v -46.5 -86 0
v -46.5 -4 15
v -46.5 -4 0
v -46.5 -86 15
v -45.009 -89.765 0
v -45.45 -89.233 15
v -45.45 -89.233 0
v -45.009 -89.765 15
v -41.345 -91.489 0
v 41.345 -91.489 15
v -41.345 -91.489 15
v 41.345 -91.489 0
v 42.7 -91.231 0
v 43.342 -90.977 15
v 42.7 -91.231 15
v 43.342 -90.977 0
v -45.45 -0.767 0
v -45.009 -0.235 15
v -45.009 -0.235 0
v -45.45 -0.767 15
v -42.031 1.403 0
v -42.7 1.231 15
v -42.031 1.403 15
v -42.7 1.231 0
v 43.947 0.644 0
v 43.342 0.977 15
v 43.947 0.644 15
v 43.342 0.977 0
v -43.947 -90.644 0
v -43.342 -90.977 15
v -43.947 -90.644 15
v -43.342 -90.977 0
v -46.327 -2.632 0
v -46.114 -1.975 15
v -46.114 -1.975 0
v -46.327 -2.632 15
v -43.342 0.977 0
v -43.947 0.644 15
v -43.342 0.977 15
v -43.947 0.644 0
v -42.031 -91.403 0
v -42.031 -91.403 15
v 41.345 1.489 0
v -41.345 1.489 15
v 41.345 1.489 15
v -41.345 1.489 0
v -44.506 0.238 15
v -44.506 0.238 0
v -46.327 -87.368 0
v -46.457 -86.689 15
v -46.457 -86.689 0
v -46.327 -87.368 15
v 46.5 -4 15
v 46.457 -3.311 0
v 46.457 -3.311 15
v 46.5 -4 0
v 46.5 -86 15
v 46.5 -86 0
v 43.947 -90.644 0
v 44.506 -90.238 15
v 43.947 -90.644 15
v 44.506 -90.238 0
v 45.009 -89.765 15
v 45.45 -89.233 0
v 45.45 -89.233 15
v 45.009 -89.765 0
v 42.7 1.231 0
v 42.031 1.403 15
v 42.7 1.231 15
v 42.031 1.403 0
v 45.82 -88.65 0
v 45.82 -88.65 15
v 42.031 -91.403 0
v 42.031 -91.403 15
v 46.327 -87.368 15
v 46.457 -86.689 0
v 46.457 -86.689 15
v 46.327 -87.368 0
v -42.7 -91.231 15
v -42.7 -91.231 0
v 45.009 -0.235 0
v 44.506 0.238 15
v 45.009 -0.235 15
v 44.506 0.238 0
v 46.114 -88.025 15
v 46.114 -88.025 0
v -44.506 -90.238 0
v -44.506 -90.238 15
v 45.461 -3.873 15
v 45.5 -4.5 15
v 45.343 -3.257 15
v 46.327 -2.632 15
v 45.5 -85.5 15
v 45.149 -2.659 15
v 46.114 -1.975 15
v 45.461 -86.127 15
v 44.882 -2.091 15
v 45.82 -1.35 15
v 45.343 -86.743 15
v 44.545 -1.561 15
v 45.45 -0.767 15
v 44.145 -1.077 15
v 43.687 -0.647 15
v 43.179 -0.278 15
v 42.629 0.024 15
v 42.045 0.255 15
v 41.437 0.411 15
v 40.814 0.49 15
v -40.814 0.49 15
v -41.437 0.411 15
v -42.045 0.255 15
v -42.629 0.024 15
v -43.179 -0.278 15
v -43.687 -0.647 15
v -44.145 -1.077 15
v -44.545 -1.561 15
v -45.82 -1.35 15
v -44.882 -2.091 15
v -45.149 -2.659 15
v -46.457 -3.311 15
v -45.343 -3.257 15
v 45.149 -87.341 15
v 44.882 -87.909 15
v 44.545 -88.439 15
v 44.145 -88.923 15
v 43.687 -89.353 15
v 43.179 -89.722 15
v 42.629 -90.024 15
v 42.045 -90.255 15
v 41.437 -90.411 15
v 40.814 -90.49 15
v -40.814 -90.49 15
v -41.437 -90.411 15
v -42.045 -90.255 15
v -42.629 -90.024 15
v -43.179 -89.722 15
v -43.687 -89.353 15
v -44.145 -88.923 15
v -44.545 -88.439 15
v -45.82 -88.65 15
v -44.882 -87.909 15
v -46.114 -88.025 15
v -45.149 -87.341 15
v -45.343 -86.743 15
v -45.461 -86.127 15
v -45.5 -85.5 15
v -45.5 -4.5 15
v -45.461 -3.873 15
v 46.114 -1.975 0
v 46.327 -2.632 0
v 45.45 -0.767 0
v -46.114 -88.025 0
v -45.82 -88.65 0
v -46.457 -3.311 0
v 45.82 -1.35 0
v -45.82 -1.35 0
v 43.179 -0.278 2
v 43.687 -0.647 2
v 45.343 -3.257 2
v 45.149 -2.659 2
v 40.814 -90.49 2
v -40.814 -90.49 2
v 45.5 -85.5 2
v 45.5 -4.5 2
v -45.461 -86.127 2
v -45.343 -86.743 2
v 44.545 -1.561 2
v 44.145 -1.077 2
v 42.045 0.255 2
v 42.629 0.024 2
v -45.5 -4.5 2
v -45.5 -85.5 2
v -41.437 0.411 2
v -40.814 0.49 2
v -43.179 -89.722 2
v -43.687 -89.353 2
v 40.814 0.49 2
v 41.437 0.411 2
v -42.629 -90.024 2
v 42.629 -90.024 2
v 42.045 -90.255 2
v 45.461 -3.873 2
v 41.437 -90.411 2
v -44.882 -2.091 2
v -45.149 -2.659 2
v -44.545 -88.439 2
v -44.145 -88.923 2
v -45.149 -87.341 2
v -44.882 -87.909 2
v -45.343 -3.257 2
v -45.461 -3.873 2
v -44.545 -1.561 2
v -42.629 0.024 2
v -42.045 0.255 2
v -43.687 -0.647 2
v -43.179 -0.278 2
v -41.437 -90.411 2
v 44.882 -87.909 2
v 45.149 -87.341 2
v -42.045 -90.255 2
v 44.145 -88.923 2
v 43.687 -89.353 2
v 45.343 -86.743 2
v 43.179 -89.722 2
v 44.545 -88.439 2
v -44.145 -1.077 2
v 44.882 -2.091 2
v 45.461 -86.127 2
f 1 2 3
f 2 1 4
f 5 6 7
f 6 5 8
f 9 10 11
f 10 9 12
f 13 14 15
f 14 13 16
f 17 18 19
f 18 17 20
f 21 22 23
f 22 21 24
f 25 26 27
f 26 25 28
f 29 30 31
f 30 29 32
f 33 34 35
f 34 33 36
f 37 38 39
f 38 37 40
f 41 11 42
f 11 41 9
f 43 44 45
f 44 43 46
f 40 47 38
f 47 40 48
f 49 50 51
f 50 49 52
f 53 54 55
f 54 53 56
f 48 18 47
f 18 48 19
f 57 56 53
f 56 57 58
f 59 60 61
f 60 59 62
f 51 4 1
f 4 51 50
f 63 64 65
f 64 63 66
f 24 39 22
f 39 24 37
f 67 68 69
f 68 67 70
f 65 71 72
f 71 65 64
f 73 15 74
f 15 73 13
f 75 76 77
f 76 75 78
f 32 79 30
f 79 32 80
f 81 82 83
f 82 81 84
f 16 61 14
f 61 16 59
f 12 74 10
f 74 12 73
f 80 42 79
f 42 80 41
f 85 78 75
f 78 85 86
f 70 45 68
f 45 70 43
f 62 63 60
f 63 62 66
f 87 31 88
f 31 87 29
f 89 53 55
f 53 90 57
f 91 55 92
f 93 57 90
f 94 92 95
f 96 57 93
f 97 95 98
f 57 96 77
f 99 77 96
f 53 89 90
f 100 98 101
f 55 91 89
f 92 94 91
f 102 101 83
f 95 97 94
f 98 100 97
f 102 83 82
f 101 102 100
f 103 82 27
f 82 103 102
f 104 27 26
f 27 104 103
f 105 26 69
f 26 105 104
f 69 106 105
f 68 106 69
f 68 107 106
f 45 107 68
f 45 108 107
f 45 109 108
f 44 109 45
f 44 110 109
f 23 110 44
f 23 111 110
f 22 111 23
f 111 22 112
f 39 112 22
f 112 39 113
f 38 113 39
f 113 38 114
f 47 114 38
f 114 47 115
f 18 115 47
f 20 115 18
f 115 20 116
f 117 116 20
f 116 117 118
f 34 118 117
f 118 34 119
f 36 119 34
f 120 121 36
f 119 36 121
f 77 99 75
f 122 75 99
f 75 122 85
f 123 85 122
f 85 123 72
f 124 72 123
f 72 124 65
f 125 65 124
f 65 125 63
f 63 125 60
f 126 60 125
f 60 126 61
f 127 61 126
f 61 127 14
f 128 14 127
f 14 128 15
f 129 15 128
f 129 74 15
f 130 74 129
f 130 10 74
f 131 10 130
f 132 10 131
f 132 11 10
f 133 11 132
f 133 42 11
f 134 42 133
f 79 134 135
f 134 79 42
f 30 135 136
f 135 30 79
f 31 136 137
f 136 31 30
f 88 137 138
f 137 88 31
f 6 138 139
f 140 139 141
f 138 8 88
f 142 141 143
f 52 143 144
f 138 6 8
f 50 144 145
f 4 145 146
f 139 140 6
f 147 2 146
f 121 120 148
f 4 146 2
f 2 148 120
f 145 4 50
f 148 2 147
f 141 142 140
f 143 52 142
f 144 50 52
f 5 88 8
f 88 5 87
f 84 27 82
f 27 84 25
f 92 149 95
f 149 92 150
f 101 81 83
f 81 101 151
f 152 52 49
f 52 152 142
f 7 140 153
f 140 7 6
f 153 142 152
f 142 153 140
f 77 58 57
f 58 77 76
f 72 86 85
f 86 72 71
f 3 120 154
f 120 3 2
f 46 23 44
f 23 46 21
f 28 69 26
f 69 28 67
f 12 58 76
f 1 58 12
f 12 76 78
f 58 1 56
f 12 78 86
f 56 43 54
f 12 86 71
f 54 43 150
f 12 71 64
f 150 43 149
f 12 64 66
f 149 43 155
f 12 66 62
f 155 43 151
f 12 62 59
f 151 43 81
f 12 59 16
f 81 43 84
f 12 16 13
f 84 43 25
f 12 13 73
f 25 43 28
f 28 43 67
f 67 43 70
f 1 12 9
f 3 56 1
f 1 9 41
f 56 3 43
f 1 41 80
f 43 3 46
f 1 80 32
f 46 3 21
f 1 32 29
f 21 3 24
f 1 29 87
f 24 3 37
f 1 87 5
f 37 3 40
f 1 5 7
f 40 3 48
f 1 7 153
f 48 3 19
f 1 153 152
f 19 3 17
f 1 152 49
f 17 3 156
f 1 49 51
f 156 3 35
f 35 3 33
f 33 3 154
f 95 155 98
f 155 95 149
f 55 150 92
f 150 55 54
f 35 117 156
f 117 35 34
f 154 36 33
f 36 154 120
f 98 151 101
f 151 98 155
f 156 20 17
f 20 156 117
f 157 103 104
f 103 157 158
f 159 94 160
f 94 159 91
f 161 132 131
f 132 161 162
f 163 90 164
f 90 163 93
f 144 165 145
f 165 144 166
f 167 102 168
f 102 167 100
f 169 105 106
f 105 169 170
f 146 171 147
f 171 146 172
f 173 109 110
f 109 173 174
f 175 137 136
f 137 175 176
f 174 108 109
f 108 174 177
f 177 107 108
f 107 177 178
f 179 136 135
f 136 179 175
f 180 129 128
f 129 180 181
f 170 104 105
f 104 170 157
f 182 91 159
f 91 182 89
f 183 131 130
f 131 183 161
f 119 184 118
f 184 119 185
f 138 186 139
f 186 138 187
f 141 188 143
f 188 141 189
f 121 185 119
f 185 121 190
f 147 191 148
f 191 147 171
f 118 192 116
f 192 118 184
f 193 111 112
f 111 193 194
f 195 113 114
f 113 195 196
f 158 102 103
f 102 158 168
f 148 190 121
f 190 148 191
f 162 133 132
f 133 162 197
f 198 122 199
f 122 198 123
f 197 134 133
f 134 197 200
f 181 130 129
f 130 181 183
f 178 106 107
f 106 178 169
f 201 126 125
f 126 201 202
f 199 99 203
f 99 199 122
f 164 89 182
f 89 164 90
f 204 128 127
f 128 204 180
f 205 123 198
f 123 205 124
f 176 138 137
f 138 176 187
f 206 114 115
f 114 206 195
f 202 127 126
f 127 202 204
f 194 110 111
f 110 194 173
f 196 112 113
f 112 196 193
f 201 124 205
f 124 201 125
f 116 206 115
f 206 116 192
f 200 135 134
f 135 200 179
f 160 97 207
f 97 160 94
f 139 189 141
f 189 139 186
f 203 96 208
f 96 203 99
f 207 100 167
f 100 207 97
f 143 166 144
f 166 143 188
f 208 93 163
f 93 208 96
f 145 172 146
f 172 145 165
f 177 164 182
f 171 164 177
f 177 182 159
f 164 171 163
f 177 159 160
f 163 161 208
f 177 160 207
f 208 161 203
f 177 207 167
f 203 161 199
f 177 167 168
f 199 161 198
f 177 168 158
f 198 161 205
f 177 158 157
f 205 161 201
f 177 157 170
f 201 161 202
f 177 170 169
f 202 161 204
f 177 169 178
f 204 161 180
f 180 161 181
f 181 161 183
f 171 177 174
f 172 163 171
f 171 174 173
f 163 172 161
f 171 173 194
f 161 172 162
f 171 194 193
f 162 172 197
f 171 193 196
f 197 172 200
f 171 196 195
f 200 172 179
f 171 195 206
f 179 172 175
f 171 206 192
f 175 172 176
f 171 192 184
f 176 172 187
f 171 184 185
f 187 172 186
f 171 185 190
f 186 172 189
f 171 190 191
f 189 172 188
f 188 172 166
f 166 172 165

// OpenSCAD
$fn = 50;


difference() {
	union() {
		translate(v = [0, -45.0000000000, 0]) {
			hull() {
				translate(v = [-41.0000000000, 41.0000000000, 0]) {
					cylinder(h = 15, r = 5.5000000000);
				}
				translate(v = [41.0000000000, 41.0000000000, 0]) {
					cylinder(h = 15, r = 5.5000000000);
				}
				translate(v = [-41.0000000000, -41.0000000000, 0]) {
					cylinder(h = 15, r = 5.5000000000);
				}
				translate(v = [41.0000000000, -41.0000000000, 0]) {
					cylinder(h = 15, r = 5.5000000000);
				}
			}
		}
	}
	union() {
		translate(v = [0, -45.0000000000, 2]) {
			hull() {
				translate(v = [-40.5000000000, 40.5000000000, 0]) {
					cylinder(h = 30, r = 5);
				}
				translate(v = [40.5000000000, 40.5000000000, 0]) {
					cylinder(h = 30, r = 5);
				}
				translate(v = [-40.5000000000, -40.5000000000, 0]) {
					cylinder(h = 30, r = 5);
				}
				translate(v = [40.5000000000, -40.5000000000, 0]) {
					cylinder(h = 30, r = 5);
				}
			}
		}
	}
}
